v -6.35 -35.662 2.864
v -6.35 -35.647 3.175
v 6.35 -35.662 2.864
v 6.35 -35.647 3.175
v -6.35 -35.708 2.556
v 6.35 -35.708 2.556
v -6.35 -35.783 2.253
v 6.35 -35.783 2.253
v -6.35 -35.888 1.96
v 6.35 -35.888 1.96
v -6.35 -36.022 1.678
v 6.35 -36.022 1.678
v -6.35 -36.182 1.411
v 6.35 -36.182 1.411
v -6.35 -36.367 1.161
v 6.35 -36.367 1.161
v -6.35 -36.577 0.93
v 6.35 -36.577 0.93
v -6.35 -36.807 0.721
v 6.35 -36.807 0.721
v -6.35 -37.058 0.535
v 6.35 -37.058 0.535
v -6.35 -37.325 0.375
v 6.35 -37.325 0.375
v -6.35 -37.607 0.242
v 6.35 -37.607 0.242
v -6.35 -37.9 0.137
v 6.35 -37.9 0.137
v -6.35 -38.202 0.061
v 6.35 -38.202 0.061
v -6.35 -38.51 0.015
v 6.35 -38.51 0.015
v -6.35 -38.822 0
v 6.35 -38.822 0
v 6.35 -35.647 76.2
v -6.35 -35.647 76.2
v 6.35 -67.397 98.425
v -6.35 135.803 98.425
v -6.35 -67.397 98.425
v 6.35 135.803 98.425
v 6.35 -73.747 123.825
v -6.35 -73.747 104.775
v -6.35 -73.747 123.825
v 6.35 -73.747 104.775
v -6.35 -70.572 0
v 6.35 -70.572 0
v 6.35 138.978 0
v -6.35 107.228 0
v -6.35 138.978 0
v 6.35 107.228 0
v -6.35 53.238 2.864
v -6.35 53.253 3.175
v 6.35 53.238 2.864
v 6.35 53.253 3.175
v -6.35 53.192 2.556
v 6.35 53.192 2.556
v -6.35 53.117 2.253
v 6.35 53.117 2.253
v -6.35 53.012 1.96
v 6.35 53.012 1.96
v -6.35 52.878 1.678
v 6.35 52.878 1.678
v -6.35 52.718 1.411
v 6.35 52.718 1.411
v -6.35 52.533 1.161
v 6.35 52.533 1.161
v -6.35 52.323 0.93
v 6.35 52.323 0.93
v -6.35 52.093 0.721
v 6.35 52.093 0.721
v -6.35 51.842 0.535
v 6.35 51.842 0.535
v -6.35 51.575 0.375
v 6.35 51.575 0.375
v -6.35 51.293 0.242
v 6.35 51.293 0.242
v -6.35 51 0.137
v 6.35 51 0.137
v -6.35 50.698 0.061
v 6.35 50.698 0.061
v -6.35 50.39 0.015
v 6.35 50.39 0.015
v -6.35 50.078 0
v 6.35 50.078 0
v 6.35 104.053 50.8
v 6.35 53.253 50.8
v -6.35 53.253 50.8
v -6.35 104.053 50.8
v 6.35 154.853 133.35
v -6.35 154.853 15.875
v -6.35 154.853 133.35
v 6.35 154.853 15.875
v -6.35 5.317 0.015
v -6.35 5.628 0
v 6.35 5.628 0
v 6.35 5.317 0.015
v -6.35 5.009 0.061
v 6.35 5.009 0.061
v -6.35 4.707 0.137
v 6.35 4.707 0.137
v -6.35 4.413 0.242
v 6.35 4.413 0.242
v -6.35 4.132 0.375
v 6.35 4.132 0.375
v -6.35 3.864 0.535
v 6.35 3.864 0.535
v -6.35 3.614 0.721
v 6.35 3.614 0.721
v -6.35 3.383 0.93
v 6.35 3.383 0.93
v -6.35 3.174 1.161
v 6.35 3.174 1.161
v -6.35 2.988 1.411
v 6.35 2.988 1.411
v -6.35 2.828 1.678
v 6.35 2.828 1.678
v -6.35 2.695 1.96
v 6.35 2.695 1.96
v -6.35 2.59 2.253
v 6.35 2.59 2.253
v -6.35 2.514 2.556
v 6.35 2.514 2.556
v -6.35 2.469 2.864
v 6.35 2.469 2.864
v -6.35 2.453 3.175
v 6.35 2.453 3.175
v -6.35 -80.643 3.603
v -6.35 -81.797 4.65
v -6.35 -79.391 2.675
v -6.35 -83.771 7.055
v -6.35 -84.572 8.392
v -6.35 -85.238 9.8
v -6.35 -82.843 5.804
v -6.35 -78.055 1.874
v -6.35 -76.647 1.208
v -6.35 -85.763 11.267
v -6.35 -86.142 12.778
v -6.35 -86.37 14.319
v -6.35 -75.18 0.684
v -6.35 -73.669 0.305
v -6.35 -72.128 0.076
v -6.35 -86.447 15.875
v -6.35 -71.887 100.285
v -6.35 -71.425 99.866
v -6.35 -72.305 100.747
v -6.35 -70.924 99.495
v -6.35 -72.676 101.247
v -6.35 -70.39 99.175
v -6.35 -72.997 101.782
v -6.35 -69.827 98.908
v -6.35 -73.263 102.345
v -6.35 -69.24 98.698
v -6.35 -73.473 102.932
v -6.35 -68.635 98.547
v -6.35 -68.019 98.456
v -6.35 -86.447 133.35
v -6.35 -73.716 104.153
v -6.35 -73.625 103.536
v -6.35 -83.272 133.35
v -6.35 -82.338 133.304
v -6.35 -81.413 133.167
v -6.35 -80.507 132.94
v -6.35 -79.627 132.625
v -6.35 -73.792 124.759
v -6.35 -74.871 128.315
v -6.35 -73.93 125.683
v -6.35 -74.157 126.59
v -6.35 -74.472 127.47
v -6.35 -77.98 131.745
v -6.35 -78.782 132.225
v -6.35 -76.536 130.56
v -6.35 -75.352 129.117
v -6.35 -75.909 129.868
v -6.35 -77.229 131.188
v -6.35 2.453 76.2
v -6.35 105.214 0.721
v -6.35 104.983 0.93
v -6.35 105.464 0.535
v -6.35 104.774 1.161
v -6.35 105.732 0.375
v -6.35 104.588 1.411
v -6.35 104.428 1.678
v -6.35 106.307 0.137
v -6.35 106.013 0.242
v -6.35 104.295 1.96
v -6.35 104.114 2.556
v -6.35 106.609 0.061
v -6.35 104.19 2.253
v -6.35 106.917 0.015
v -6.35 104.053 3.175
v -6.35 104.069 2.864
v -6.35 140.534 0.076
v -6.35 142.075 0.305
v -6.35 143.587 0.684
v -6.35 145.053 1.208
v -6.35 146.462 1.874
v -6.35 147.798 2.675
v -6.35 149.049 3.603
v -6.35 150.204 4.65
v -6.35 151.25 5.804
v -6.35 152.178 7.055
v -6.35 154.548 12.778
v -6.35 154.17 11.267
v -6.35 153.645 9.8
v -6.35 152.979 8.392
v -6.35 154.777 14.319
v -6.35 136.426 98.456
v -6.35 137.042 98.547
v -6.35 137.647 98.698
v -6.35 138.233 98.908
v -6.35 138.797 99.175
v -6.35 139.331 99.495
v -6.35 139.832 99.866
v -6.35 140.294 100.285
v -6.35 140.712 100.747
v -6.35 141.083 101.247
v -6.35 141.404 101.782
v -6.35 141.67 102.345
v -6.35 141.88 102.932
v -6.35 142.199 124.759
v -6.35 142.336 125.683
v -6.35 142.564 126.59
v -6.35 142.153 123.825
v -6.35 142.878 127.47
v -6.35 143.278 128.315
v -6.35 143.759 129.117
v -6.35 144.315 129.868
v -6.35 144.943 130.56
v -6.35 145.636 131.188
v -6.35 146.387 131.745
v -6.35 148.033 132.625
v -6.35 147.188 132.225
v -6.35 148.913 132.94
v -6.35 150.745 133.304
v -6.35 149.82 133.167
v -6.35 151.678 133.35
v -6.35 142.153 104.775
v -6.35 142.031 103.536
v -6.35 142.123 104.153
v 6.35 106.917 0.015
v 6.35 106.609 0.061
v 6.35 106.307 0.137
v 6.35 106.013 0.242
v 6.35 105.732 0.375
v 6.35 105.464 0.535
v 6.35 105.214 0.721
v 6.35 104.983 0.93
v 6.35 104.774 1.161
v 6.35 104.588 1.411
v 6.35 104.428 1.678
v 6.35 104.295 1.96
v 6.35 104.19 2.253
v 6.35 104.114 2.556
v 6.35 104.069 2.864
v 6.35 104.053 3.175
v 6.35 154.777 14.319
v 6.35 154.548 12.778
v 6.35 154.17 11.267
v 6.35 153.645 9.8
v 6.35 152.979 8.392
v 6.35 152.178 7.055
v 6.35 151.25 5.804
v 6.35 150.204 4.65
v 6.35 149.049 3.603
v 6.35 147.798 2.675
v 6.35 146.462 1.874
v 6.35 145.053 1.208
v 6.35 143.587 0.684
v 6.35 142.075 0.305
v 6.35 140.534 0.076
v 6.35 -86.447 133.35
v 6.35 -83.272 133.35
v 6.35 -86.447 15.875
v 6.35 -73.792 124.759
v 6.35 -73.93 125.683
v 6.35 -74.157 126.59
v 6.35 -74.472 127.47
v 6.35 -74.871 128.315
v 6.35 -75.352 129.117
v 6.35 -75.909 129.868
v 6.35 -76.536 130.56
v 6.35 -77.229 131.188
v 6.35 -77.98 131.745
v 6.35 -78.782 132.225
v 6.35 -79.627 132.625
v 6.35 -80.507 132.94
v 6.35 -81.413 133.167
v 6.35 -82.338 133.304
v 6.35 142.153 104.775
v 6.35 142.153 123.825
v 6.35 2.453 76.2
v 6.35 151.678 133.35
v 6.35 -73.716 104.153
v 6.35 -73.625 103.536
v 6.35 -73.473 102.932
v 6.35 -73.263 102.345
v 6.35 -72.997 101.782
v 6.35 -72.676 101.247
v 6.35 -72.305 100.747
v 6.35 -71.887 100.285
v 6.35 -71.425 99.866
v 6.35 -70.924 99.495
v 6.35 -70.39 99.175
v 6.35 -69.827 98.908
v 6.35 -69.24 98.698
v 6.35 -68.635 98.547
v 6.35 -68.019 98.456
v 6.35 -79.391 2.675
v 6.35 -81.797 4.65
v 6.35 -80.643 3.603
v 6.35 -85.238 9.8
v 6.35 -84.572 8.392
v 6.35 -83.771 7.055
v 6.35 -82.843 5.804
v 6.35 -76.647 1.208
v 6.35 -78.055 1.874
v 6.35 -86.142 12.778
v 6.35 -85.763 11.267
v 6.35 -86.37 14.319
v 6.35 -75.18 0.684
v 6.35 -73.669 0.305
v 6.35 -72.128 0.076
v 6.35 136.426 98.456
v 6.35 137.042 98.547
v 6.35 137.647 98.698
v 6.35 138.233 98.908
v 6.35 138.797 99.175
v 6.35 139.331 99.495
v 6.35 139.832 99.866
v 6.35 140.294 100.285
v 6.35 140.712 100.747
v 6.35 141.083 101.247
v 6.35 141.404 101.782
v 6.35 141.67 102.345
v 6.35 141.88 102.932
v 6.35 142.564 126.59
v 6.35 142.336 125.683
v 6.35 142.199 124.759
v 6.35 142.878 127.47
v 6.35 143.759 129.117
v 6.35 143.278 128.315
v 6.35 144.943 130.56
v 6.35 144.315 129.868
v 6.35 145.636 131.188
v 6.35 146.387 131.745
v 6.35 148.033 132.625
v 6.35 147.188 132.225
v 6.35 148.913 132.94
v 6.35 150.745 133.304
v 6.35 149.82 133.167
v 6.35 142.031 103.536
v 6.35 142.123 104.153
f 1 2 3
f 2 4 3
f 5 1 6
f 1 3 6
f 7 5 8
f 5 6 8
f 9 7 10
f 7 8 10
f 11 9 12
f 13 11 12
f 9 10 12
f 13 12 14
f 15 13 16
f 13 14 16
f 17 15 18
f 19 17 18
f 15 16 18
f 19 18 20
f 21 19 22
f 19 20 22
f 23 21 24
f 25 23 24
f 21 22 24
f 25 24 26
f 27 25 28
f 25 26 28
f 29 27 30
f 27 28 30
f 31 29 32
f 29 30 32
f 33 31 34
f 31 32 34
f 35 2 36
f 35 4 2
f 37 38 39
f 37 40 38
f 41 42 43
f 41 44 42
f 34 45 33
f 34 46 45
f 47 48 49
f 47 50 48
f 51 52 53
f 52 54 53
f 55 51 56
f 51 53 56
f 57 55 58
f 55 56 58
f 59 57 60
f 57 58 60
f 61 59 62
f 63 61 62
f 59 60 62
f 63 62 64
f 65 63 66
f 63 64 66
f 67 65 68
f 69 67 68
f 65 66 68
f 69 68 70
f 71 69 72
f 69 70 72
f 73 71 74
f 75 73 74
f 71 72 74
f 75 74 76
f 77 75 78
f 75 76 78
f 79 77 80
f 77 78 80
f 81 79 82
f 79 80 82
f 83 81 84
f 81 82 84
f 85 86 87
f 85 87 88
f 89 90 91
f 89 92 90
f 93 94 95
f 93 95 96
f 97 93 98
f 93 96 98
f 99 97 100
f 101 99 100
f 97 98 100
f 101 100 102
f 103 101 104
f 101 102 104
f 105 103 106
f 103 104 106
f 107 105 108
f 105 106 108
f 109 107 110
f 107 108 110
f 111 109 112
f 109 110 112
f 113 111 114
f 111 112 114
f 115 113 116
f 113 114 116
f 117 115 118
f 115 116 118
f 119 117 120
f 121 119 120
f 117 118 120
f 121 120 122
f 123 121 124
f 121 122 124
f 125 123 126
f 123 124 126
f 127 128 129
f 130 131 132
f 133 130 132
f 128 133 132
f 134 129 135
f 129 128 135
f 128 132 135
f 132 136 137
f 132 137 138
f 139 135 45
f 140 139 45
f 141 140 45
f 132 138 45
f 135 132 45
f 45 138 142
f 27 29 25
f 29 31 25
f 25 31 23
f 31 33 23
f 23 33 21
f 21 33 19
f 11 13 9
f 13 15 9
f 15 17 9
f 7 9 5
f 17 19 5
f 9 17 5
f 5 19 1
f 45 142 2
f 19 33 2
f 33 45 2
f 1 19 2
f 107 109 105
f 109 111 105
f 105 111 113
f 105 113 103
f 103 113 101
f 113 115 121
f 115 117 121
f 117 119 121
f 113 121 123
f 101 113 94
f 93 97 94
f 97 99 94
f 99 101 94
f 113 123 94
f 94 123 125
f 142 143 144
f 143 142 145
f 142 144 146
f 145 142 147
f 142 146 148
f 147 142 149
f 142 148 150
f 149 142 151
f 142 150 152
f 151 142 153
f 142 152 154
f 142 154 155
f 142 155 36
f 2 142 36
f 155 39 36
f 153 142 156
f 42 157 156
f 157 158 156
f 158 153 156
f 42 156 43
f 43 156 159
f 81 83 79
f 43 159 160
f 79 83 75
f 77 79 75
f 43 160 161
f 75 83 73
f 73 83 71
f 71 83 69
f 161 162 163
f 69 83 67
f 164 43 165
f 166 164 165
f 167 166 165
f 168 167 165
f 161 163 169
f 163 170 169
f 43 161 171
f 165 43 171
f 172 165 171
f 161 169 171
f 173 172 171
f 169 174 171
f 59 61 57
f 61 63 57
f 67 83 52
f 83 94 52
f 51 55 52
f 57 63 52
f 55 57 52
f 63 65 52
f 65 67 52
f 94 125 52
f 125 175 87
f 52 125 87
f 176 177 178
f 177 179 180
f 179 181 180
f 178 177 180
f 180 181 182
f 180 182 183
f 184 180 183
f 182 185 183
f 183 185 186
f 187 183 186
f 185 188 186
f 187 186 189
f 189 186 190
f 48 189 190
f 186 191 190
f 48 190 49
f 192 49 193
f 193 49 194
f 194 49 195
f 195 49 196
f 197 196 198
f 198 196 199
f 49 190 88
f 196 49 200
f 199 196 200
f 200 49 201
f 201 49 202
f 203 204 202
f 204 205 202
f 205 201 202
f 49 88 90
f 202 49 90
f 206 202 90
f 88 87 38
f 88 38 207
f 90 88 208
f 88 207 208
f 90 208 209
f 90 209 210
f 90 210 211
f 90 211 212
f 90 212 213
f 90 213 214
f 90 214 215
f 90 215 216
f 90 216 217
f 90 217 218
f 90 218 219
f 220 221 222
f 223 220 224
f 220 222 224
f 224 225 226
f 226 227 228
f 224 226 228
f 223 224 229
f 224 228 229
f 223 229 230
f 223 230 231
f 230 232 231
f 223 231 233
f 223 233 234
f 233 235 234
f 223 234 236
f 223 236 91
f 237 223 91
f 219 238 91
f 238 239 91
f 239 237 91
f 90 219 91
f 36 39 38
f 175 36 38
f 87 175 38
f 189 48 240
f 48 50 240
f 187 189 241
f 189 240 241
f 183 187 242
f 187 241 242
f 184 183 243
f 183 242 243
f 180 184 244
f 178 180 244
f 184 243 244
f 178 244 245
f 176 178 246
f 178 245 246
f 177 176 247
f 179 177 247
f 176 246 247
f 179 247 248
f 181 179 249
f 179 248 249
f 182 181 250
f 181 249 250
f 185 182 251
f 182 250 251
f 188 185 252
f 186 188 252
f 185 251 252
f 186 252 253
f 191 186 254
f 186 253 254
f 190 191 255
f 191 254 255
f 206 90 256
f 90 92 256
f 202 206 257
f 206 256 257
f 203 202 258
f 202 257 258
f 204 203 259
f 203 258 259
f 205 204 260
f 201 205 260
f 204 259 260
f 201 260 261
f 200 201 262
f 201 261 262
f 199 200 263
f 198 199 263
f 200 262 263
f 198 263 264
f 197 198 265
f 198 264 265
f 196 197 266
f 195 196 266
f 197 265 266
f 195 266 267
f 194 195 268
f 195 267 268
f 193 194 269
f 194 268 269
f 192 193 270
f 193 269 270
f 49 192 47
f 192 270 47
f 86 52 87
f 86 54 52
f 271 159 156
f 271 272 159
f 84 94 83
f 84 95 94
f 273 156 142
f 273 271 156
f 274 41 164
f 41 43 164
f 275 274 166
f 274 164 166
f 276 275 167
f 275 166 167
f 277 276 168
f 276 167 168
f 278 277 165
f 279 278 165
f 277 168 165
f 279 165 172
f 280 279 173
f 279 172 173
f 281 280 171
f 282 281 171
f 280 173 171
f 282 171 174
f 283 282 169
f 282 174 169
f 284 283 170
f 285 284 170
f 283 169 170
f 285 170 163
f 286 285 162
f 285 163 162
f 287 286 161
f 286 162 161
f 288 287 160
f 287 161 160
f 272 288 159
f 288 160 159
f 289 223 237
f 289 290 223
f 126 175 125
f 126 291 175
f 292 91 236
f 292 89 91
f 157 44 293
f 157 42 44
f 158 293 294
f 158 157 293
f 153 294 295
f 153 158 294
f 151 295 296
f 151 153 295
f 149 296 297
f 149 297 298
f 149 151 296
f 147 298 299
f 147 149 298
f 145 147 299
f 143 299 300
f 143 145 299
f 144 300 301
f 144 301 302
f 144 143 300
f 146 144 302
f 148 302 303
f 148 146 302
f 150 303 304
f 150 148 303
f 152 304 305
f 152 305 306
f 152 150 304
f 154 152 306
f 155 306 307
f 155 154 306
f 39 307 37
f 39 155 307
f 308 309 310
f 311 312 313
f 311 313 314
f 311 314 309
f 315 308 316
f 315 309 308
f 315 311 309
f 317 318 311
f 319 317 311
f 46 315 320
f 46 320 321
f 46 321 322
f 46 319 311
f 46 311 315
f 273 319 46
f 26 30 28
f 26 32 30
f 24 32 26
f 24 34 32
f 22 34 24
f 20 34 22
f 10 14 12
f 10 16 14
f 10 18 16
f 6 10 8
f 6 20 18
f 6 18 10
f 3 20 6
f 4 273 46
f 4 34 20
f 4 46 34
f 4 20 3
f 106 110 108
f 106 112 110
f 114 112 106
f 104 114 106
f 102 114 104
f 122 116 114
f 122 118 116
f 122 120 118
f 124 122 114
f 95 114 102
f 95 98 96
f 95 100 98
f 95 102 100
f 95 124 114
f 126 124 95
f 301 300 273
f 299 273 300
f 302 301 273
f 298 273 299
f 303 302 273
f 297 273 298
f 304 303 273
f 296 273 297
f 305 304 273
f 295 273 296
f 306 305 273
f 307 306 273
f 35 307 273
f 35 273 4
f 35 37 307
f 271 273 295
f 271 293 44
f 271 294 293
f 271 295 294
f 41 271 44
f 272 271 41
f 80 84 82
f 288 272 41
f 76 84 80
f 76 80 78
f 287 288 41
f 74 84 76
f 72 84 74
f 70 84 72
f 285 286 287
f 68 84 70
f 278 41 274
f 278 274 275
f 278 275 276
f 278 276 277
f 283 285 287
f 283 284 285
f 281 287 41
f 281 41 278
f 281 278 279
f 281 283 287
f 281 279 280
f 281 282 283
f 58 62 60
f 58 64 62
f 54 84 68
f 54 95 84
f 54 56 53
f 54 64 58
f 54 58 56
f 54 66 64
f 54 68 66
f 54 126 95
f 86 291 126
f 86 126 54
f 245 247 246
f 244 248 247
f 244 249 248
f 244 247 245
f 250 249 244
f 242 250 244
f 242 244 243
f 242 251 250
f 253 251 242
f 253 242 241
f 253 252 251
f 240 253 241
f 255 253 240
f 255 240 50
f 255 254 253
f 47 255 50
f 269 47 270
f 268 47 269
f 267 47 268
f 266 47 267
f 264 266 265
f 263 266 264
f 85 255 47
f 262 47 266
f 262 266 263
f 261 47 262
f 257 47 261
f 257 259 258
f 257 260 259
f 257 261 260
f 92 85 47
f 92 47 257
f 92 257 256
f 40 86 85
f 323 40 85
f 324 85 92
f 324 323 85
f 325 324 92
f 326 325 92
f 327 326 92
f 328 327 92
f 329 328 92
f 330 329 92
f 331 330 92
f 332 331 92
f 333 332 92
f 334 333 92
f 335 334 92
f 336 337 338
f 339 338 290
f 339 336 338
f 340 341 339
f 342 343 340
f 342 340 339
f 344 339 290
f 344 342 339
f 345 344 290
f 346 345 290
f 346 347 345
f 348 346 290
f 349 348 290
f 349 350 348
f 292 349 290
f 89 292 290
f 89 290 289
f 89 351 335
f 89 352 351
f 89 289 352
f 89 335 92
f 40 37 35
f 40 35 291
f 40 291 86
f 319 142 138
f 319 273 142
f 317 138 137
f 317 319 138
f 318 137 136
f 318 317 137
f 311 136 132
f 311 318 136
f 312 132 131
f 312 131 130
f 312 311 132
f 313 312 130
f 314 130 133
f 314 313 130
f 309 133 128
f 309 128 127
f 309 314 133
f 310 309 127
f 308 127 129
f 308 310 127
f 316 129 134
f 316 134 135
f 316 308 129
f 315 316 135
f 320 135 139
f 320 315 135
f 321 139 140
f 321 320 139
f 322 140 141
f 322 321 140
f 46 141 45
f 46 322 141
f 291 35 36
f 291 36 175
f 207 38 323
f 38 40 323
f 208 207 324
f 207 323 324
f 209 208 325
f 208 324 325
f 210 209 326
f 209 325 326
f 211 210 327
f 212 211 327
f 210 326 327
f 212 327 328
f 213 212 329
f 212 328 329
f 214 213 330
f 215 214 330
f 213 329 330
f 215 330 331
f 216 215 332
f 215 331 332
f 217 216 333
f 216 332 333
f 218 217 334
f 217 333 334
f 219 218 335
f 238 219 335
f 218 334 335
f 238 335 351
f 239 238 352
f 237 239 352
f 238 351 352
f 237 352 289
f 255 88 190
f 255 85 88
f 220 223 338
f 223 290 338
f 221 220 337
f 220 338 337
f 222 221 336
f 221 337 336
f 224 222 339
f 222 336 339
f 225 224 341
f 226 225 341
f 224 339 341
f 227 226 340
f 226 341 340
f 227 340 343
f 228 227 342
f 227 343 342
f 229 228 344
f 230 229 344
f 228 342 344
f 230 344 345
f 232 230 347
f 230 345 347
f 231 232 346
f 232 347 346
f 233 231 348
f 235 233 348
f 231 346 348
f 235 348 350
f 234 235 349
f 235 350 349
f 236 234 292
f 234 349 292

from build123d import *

# Parameters (mm, degrees)
F1_DEPTH = 6.35
F2_R     = 3.175
F3_R     = 6.35
F4_R     = 9.525
F5_R     = 15.875


with BuildPart() as f1:
    # F0 (on Right) → F1 (new body, symmetric)
    with BuildSketch(Plane.YZ):
        Polygon((-86.446608, 133.35), (-86.446608, 0), (-35.646608, 0), (-35.646608, 76.2), (2.453392, 76.2), (2.453392, 0), (53.253392, 0), (53.253392, 50.8), (104.053392, 50.8), (104.053392, 0), (154.853392, 0), (154.853392, 133.35), (142.153392, 133.35), (142.153392, 98.425), (-73.746608, 98.425), (-73.746608, 133.35), align=None)
    extrude(amount=F1_DEPTH, both=True)

    # F2
    f2_edges = [f1.edges().sort_by_distance(p)[0] for p in [
        (0, 53.253392, 0),
        (0, 104.053392, 0),
        (0, 2.453392, 0),
        (0, -35.646608, 0),
    ]]
    fillet(f2_edges, radius=F2_R)

    # F3
    f3_edges = [f1.edges().sort_by_distance(p)[0] for p in [
        (0, -73.746608, 98.425),
        (0, 142.153392, 98.425),
    ]]
    fillet(f3_edges, radius=F3_R)

    # F4
    f4_edges = [f1.edges().sort_by_distance(p)[0] for p in [
        (0, -73.746608, 133.35),
        (0, 142.153392, 133.35),
    ]]
    fillet(f4_edges, radius=F4_R)

    # F5
    f5_edges = [f1.edges().sort_by_distance(p)[0] for p in [
        (0, -86.446608, 0),
        (0, 154.853392, 0),
    ]]
    fillet(f5_edges, radius=F5_R)


solid = f1.part
